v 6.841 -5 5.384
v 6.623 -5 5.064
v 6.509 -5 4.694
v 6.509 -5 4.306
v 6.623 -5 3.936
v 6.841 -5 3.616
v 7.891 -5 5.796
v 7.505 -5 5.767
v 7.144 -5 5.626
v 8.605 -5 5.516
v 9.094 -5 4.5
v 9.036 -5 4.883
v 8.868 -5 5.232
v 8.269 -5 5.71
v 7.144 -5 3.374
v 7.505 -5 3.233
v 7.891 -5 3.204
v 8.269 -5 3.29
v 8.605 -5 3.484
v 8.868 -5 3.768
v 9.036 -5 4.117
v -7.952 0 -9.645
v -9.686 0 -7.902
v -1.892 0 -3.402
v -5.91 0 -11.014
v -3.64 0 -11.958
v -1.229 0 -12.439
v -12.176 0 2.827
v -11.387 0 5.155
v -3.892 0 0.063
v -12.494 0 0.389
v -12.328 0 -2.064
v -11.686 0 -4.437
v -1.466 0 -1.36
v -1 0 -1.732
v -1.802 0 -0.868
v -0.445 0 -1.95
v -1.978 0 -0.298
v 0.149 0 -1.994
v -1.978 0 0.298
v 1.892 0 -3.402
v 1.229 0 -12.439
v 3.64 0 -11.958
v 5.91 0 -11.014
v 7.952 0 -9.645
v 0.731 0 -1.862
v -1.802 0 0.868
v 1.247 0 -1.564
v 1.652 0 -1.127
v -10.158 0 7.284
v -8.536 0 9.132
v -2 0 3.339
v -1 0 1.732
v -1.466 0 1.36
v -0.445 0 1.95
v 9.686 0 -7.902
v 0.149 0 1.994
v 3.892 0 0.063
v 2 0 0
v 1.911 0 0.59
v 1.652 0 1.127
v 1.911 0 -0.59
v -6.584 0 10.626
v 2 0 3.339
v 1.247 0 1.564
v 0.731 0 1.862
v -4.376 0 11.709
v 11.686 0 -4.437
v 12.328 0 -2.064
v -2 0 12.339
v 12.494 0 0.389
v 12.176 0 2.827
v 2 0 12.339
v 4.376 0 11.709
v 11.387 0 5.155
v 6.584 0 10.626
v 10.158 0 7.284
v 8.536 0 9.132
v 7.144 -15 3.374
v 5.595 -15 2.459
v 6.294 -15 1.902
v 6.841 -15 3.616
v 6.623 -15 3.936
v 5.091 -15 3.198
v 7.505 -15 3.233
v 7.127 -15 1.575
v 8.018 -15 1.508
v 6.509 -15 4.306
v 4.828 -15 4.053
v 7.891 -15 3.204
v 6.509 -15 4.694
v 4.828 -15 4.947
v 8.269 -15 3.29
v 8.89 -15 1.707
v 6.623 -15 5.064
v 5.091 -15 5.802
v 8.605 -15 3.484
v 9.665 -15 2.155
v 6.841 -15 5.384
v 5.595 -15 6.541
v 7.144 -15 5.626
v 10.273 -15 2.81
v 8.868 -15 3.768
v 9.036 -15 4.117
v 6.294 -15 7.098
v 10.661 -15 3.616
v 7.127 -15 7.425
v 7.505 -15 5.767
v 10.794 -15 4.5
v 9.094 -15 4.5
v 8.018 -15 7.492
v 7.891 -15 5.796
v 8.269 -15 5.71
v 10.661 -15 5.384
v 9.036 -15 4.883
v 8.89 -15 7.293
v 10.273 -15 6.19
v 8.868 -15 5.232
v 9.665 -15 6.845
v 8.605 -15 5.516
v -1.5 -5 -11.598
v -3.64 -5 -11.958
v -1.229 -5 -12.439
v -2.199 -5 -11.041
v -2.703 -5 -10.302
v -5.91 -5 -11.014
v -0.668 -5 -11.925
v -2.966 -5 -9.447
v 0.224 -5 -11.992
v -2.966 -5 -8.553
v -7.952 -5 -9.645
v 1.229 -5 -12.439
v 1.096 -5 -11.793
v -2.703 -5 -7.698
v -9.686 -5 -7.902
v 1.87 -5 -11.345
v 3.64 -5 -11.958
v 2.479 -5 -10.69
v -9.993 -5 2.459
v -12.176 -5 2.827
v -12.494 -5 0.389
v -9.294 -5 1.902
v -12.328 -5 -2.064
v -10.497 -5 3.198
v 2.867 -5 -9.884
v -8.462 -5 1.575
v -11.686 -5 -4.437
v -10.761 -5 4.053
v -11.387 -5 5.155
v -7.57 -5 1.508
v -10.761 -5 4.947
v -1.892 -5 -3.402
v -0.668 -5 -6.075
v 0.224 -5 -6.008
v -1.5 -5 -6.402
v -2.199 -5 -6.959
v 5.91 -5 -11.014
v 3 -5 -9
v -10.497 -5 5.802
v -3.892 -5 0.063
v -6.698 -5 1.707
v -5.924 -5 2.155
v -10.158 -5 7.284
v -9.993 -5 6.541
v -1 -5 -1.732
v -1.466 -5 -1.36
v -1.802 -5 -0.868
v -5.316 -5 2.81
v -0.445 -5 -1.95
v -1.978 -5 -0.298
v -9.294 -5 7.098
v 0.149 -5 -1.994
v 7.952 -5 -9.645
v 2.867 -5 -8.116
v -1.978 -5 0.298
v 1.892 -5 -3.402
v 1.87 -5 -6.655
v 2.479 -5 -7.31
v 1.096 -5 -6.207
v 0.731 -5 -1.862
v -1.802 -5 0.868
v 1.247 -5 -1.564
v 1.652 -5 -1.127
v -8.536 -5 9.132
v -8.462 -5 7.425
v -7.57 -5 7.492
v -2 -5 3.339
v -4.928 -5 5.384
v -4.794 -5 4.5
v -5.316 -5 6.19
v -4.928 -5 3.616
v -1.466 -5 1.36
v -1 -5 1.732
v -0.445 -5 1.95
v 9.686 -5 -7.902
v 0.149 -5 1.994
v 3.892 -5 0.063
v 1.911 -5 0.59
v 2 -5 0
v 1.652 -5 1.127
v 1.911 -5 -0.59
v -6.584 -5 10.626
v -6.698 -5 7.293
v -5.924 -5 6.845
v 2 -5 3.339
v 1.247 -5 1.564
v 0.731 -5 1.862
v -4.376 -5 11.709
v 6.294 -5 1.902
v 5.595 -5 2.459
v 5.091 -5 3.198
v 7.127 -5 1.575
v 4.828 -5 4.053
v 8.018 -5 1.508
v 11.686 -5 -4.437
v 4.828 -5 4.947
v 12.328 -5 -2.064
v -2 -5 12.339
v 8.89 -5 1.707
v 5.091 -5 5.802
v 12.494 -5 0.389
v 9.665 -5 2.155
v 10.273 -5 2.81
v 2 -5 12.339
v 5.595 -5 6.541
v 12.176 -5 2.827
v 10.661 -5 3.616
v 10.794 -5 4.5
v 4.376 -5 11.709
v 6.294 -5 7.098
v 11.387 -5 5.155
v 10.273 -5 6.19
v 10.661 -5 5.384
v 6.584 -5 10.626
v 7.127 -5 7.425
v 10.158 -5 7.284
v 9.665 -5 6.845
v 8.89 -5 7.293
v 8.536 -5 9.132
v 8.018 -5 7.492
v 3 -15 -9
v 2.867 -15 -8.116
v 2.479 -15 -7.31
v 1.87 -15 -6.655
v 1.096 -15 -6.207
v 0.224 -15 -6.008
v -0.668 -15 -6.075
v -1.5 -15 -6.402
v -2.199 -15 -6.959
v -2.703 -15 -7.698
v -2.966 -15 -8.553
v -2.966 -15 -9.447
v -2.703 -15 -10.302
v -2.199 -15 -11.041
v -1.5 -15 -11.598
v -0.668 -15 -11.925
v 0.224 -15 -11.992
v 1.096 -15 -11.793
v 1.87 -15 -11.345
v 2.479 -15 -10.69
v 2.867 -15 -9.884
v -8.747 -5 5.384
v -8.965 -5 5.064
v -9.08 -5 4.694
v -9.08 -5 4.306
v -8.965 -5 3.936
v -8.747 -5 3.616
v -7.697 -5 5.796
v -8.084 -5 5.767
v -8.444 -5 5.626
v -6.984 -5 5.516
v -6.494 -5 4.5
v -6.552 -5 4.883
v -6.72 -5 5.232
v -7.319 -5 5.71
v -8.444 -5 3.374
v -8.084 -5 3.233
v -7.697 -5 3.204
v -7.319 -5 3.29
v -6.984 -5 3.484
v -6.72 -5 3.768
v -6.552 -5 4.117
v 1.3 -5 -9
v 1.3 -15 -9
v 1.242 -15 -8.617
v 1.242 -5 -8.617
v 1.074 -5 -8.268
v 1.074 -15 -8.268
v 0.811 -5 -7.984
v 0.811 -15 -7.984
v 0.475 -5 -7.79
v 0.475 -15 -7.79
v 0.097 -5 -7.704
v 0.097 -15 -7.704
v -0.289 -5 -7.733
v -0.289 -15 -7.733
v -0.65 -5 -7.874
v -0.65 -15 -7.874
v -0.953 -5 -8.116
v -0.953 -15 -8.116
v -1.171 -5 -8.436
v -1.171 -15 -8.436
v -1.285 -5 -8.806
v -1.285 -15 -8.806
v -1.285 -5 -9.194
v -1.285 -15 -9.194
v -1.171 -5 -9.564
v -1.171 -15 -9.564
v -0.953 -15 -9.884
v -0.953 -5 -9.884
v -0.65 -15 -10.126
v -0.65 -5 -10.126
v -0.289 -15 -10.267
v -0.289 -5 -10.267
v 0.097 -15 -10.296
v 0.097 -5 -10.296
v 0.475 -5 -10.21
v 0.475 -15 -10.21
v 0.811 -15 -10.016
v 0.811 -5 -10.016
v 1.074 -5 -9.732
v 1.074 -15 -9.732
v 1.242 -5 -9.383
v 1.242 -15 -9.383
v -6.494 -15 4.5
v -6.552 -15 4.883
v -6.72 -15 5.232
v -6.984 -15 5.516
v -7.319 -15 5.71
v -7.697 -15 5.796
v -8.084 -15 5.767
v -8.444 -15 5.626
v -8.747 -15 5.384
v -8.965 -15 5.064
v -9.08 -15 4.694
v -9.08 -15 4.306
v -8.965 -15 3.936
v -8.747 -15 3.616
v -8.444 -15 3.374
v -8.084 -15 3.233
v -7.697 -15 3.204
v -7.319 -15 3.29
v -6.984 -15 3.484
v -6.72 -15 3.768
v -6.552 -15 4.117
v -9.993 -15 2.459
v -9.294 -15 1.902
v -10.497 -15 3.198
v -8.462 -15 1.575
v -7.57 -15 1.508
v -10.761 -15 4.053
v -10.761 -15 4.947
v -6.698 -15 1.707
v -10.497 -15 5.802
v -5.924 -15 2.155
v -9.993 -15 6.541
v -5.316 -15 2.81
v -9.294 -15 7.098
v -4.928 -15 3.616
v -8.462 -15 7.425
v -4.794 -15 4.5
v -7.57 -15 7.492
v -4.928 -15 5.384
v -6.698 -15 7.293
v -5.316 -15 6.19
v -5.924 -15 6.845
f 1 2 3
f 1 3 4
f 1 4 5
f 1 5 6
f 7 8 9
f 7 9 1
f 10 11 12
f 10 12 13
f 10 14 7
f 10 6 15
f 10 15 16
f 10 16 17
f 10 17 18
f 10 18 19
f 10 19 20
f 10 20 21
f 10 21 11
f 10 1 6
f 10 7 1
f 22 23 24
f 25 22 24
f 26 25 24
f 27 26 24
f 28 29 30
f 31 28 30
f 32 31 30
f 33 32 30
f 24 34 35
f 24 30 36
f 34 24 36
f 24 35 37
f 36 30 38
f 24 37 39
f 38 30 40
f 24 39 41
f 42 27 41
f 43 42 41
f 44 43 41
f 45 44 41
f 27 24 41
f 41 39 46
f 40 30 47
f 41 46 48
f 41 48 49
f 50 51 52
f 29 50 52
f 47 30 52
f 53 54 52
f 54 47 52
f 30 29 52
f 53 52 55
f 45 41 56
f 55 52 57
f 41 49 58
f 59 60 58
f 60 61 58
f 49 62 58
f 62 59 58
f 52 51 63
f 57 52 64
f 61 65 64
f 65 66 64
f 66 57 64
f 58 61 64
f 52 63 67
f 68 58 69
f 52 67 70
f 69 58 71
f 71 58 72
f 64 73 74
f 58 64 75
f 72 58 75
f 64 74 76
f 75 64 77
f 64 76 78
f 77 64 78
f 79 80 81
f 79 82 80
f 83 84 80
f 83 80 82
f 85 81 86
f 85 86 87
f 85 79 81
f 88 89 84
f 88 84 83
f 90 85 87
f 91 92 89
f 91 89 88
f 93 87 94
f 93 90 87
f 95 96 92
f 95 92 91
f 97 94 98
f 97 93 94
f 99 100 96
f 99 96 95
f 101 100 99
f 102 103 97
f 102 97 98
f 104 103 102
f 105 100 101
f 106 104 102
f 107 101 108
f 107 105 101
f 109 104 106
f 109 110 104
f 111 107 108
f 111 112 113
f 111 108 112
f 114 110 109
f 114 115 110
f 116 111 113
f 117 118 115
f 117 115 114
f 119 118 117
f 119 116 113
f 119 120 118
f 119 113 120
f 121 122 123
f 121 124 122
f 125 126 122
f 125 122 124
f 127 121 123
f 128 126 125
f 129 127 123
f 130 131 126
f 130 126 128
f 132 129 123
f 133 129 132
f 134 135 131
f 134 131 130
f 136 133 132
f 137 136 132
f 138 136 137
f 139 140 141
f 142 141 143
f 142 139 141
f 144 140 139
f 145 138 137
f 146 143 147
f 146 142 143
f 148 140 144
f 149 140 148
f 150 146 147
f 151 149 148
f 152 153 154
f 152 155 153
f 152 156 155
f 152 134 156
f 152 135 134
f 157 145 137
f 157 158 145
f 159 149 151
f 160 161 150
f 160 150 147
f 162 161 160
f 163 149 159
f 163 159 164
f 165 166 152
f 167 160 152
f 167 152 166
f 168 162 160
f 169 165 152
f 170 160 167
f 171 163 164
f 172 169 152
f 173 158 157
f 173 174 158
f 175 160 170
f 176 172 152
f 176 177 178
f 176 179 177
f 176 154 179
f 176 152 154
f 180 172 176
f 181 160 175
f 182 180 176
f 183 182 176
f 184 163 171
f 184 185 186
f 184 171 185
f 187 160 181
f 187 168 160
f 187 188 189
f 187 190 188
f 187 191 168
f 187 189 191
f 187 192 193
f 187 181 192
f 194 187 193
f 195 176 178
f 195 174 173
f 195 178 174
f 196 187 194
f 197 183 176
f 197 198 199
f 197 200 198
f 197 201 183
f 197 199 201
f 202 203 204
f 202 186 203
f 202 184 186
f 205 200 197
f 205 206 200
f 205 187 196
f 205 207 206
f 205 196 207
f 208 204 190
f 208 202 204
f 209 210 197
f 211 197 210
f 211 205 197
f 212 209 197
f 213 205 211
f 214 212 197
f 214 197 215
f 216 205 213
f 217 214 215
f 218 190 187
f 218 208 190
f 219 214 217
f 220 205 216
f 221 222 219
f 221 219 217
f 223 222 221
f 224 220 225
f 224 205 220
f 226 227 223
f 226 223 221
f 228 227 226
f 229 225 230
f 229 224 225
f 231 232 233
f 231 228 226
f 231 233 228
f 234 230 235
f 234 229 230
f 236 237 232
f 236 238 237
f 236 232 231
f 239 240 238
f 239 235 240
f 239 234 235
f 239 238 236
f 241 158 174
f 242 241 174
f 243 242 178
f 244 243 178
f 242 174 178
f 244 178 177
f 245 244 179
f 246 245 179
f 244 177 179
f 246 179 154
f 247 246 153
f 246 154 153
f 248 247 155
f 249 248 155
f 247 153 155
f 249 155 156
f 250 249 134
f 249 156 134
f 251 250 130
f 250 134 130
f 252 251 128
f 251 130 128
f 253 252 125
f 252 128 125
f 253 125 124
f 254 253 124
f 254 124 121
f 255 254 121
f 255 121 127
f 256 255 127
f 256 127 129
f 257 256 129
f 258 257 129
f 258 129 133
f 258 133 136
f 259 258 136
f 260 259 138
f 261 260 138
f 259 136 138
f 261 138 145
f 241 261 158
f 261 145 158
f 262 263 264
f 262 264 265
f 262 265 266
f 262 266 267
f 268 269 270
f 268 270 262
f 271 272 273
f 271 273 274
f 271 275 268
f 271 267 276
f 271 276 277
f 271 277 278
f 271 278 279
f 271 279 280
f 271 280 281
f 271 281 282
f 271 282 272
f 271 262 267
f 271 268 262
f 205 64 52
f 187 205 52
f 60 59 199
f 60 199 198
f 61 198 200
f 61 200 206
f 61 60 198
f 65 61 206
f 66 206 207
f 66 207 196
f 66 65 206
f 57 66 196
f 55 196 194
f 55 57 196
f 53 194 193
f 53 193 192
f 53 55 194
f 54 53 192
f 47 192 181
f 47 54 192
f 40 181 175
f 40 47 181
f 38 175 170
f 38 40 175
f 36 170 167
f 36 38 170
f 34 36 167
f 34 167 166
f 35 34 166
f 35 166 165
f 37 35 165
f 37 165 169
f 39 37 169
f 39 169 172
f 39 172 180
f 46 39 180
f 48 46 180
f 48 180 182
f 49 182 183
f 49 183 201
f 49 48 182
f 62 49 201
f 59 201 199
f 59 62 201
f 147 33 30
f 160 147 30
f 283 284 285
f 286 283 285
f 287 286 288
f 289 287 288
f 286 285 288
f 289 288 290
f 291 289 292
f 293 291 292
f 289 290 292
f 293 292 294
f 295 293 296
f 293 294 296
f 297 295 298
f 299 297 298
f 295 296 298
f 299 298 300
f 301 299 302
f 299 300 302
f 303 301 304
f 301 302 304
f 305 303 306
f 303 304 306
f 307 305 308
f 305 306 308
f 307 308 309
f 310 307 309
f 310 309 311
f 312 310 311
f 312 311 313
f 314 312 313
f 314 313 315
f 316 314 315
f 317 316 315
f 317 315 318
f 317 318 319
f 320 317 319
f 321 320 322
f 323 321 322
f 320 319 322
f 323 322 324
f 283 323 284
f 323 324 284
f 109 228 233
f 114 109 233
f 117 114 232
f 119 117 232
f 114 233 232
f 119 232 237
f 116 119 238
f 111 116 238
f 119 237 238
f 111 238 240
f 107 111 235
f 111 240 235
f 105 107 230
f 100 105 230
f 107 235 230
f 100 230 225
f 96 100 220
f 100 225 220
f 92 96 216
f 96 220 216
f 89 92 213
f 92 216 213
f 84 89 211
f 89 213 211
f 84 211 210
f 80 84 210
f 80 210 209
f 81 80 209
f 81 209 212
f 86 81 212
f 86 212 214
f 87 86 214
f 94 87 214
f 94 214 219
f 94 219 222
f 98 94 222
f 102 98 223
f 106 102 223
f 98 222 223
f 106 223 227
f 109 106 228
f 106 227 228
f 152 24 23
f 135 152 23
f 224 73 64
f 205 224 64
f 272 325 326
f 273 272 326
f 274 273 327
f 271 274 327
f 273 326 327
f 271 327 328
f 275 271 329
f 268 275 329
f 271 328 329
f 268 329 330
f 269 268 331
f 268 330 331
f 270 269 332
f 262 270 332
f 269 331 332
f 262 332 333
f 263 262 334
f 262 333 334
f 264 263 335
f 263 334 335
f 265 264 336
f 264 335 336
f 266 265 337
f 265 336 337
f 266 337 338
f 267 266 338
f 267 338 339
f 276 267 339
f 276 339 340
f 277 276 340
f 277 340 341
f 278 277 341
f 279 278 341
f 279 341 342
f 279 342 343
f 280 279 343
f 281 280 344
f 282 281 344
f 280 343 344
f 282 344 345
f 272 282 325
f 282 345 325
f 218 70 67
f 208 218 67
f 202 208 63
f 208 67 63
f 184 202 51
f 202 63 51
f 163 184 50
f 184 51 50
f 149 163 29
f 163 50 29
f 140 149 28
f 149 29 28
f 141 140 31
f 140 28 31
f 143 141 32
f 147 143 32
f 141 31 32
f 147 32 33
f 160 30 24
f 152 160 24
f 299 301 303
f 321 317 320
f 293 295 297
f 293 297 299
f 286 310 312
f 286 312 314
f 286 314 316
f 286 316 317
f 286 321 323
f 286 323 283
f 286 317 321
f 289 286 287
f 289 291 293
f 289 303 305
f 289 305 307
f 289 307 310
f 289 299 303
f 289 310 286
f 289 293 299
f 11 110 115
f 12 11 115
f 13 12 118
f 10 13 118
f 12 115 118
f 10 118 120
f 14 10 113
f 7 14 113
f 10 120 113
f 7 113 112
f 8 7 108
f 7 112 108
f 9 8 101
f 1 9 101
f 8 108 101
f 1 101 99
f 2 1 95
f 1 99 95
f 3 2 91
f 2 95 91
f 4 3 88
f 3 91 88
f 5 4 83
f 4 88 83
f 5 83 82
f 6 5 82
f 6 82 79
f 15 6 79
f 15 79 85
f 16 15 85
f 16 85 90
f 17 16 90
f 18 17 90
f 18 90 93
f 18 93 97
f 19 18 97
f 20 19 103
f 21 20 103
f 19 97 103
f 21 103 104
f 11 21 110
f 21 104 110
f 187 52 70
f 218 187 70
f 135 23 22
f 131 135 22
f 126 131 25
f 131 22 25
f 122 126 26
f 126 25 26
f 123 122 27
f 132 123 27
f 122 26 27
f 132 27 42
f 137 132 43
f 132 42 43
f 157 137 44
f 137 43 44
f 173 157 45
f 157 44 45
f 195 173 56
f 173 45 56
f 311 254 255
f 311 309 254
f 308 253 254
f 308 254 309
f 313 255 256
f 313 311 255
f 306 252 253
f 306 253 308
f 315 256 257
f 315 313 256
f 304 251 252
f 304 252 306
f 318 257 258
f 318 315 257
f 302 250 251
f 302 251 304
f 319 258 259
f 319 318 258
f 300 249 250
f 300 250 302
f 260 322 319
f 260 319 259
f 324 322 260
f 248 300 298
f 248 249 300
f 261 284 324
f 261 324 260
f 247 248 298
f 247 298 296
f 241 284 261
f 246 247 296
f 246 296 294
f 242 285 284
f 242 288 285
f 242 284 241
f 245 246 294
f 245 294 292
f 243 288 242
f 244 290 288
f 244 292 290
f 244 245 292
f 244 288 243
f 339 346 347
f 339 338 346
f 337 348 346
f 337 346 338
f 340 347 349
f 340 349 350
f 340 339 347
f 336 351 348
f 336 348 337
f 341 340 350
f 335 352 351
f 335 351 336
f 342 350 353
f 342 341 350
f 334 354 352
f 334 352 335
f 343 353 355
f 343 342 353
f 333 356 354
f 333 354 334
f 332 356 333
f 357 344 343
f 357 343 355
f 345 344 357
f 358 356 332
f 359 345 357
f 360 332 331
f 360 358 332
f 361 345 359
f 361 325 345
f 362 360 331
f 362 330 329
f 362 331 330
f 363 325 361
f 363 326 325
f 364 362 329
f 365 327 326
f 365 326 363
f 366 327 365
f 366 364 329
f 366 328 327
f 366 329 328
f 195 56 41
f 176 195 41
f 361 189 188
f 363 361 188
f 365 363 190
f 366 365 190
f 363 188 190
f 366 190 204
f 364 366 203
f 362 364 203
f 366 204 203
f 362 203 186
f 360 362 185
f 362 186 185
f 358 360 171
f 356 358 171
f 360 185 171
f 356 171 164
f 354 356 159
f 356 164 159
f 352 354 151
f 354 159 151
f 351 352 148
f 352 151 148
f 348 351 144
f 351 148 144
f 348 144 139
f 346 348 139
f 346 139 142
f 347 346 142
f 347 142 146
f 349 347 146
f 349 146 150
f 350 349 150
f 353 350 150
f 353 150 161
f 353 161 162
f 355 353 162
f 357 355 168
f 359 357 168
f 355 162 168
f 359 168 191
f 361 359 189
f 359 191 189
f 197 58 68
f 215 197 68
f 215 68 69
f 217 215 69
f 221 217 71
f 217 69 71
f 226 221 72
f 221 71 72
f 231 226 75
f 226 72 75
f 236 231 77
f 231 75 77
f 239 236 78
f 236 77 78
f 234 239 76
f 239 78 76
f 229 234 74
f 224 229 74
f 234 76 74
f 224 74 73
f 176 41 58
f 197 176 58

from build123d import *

# Parameters (mm, degrees)
F0_R     = 2
F1_DEPTH = 5
F2_R     = 3
F3_DEPTH = 10
F4_R     = 1.3
F5_DEPTH = 10


with BuildPart() as f1:
    # F0 (on Front) → F1 (new body)
    with BuildSketch(Plane.XZ):
        with BuildLine():
            Line((-2, 3.338963), (-2, 12.338963))
            ThreePointArc((-2, 12.338963), (-10.825318, 6.25), (-11.685855, -4.437431))
            Line((-11.685855, -4.437431), (-3.891627, 0.062569))
            Line((-3.891627, 0.062569), (-1.891627, -3.401532))
            Line((-1.891627, -3.401532), (-9.685855, -7.901532))
            ThreePointArc((-9.685855, -7.901532), (0, -12.5), (9.685855, -7.901532))
            Line((9.685855, -7.901532), (1.891627, -3.401532))
            Line((1.891627, -3.401532), (3.891627, 0.062569))
            Line((3.891627, 0.062569), (11.685855, -4.437431))
            ThreePointArc((11.685855, -4.437431), (10.825318, 6.25), (2, 12.338963))
            Line((2, 12.338963), (2, 3.338963))
            Line((2, 3.338963), (-2, 3.338963))
        make_face()
        Circle(F0_R, mode=Mode.SUBTRACT)
    extrude(amount=F1_DEPTH)

    # F2 (on face) → F3 (join)
    with BuildSketch(Plane.XZ.offset(5)):
        with Locations((7.794229, 4.5)):
            Circle(F2_R)
        with Locations((-7.794229, 4.5)):
            Circle(F2_R)
        with Locations((0, -9)):
            Circle(F2_R)
    extrude(amount=F3_DEPTH)

    # F4 (on face) → F5 (cut)
    with BuildSketch(Plane.XZ.offset(15)):
        with Locations((0, -9)):
            Circle(F4_R)
        with Locations((7.794229, 4.5)):
            Circle(F4_R)
        with Locations((-7.794229, 4.5)):
            Circle(F4_R)
    extrude(amount=-F5_DEPTH, mode=Mode.SUBTRACT)


solid = f1.part
